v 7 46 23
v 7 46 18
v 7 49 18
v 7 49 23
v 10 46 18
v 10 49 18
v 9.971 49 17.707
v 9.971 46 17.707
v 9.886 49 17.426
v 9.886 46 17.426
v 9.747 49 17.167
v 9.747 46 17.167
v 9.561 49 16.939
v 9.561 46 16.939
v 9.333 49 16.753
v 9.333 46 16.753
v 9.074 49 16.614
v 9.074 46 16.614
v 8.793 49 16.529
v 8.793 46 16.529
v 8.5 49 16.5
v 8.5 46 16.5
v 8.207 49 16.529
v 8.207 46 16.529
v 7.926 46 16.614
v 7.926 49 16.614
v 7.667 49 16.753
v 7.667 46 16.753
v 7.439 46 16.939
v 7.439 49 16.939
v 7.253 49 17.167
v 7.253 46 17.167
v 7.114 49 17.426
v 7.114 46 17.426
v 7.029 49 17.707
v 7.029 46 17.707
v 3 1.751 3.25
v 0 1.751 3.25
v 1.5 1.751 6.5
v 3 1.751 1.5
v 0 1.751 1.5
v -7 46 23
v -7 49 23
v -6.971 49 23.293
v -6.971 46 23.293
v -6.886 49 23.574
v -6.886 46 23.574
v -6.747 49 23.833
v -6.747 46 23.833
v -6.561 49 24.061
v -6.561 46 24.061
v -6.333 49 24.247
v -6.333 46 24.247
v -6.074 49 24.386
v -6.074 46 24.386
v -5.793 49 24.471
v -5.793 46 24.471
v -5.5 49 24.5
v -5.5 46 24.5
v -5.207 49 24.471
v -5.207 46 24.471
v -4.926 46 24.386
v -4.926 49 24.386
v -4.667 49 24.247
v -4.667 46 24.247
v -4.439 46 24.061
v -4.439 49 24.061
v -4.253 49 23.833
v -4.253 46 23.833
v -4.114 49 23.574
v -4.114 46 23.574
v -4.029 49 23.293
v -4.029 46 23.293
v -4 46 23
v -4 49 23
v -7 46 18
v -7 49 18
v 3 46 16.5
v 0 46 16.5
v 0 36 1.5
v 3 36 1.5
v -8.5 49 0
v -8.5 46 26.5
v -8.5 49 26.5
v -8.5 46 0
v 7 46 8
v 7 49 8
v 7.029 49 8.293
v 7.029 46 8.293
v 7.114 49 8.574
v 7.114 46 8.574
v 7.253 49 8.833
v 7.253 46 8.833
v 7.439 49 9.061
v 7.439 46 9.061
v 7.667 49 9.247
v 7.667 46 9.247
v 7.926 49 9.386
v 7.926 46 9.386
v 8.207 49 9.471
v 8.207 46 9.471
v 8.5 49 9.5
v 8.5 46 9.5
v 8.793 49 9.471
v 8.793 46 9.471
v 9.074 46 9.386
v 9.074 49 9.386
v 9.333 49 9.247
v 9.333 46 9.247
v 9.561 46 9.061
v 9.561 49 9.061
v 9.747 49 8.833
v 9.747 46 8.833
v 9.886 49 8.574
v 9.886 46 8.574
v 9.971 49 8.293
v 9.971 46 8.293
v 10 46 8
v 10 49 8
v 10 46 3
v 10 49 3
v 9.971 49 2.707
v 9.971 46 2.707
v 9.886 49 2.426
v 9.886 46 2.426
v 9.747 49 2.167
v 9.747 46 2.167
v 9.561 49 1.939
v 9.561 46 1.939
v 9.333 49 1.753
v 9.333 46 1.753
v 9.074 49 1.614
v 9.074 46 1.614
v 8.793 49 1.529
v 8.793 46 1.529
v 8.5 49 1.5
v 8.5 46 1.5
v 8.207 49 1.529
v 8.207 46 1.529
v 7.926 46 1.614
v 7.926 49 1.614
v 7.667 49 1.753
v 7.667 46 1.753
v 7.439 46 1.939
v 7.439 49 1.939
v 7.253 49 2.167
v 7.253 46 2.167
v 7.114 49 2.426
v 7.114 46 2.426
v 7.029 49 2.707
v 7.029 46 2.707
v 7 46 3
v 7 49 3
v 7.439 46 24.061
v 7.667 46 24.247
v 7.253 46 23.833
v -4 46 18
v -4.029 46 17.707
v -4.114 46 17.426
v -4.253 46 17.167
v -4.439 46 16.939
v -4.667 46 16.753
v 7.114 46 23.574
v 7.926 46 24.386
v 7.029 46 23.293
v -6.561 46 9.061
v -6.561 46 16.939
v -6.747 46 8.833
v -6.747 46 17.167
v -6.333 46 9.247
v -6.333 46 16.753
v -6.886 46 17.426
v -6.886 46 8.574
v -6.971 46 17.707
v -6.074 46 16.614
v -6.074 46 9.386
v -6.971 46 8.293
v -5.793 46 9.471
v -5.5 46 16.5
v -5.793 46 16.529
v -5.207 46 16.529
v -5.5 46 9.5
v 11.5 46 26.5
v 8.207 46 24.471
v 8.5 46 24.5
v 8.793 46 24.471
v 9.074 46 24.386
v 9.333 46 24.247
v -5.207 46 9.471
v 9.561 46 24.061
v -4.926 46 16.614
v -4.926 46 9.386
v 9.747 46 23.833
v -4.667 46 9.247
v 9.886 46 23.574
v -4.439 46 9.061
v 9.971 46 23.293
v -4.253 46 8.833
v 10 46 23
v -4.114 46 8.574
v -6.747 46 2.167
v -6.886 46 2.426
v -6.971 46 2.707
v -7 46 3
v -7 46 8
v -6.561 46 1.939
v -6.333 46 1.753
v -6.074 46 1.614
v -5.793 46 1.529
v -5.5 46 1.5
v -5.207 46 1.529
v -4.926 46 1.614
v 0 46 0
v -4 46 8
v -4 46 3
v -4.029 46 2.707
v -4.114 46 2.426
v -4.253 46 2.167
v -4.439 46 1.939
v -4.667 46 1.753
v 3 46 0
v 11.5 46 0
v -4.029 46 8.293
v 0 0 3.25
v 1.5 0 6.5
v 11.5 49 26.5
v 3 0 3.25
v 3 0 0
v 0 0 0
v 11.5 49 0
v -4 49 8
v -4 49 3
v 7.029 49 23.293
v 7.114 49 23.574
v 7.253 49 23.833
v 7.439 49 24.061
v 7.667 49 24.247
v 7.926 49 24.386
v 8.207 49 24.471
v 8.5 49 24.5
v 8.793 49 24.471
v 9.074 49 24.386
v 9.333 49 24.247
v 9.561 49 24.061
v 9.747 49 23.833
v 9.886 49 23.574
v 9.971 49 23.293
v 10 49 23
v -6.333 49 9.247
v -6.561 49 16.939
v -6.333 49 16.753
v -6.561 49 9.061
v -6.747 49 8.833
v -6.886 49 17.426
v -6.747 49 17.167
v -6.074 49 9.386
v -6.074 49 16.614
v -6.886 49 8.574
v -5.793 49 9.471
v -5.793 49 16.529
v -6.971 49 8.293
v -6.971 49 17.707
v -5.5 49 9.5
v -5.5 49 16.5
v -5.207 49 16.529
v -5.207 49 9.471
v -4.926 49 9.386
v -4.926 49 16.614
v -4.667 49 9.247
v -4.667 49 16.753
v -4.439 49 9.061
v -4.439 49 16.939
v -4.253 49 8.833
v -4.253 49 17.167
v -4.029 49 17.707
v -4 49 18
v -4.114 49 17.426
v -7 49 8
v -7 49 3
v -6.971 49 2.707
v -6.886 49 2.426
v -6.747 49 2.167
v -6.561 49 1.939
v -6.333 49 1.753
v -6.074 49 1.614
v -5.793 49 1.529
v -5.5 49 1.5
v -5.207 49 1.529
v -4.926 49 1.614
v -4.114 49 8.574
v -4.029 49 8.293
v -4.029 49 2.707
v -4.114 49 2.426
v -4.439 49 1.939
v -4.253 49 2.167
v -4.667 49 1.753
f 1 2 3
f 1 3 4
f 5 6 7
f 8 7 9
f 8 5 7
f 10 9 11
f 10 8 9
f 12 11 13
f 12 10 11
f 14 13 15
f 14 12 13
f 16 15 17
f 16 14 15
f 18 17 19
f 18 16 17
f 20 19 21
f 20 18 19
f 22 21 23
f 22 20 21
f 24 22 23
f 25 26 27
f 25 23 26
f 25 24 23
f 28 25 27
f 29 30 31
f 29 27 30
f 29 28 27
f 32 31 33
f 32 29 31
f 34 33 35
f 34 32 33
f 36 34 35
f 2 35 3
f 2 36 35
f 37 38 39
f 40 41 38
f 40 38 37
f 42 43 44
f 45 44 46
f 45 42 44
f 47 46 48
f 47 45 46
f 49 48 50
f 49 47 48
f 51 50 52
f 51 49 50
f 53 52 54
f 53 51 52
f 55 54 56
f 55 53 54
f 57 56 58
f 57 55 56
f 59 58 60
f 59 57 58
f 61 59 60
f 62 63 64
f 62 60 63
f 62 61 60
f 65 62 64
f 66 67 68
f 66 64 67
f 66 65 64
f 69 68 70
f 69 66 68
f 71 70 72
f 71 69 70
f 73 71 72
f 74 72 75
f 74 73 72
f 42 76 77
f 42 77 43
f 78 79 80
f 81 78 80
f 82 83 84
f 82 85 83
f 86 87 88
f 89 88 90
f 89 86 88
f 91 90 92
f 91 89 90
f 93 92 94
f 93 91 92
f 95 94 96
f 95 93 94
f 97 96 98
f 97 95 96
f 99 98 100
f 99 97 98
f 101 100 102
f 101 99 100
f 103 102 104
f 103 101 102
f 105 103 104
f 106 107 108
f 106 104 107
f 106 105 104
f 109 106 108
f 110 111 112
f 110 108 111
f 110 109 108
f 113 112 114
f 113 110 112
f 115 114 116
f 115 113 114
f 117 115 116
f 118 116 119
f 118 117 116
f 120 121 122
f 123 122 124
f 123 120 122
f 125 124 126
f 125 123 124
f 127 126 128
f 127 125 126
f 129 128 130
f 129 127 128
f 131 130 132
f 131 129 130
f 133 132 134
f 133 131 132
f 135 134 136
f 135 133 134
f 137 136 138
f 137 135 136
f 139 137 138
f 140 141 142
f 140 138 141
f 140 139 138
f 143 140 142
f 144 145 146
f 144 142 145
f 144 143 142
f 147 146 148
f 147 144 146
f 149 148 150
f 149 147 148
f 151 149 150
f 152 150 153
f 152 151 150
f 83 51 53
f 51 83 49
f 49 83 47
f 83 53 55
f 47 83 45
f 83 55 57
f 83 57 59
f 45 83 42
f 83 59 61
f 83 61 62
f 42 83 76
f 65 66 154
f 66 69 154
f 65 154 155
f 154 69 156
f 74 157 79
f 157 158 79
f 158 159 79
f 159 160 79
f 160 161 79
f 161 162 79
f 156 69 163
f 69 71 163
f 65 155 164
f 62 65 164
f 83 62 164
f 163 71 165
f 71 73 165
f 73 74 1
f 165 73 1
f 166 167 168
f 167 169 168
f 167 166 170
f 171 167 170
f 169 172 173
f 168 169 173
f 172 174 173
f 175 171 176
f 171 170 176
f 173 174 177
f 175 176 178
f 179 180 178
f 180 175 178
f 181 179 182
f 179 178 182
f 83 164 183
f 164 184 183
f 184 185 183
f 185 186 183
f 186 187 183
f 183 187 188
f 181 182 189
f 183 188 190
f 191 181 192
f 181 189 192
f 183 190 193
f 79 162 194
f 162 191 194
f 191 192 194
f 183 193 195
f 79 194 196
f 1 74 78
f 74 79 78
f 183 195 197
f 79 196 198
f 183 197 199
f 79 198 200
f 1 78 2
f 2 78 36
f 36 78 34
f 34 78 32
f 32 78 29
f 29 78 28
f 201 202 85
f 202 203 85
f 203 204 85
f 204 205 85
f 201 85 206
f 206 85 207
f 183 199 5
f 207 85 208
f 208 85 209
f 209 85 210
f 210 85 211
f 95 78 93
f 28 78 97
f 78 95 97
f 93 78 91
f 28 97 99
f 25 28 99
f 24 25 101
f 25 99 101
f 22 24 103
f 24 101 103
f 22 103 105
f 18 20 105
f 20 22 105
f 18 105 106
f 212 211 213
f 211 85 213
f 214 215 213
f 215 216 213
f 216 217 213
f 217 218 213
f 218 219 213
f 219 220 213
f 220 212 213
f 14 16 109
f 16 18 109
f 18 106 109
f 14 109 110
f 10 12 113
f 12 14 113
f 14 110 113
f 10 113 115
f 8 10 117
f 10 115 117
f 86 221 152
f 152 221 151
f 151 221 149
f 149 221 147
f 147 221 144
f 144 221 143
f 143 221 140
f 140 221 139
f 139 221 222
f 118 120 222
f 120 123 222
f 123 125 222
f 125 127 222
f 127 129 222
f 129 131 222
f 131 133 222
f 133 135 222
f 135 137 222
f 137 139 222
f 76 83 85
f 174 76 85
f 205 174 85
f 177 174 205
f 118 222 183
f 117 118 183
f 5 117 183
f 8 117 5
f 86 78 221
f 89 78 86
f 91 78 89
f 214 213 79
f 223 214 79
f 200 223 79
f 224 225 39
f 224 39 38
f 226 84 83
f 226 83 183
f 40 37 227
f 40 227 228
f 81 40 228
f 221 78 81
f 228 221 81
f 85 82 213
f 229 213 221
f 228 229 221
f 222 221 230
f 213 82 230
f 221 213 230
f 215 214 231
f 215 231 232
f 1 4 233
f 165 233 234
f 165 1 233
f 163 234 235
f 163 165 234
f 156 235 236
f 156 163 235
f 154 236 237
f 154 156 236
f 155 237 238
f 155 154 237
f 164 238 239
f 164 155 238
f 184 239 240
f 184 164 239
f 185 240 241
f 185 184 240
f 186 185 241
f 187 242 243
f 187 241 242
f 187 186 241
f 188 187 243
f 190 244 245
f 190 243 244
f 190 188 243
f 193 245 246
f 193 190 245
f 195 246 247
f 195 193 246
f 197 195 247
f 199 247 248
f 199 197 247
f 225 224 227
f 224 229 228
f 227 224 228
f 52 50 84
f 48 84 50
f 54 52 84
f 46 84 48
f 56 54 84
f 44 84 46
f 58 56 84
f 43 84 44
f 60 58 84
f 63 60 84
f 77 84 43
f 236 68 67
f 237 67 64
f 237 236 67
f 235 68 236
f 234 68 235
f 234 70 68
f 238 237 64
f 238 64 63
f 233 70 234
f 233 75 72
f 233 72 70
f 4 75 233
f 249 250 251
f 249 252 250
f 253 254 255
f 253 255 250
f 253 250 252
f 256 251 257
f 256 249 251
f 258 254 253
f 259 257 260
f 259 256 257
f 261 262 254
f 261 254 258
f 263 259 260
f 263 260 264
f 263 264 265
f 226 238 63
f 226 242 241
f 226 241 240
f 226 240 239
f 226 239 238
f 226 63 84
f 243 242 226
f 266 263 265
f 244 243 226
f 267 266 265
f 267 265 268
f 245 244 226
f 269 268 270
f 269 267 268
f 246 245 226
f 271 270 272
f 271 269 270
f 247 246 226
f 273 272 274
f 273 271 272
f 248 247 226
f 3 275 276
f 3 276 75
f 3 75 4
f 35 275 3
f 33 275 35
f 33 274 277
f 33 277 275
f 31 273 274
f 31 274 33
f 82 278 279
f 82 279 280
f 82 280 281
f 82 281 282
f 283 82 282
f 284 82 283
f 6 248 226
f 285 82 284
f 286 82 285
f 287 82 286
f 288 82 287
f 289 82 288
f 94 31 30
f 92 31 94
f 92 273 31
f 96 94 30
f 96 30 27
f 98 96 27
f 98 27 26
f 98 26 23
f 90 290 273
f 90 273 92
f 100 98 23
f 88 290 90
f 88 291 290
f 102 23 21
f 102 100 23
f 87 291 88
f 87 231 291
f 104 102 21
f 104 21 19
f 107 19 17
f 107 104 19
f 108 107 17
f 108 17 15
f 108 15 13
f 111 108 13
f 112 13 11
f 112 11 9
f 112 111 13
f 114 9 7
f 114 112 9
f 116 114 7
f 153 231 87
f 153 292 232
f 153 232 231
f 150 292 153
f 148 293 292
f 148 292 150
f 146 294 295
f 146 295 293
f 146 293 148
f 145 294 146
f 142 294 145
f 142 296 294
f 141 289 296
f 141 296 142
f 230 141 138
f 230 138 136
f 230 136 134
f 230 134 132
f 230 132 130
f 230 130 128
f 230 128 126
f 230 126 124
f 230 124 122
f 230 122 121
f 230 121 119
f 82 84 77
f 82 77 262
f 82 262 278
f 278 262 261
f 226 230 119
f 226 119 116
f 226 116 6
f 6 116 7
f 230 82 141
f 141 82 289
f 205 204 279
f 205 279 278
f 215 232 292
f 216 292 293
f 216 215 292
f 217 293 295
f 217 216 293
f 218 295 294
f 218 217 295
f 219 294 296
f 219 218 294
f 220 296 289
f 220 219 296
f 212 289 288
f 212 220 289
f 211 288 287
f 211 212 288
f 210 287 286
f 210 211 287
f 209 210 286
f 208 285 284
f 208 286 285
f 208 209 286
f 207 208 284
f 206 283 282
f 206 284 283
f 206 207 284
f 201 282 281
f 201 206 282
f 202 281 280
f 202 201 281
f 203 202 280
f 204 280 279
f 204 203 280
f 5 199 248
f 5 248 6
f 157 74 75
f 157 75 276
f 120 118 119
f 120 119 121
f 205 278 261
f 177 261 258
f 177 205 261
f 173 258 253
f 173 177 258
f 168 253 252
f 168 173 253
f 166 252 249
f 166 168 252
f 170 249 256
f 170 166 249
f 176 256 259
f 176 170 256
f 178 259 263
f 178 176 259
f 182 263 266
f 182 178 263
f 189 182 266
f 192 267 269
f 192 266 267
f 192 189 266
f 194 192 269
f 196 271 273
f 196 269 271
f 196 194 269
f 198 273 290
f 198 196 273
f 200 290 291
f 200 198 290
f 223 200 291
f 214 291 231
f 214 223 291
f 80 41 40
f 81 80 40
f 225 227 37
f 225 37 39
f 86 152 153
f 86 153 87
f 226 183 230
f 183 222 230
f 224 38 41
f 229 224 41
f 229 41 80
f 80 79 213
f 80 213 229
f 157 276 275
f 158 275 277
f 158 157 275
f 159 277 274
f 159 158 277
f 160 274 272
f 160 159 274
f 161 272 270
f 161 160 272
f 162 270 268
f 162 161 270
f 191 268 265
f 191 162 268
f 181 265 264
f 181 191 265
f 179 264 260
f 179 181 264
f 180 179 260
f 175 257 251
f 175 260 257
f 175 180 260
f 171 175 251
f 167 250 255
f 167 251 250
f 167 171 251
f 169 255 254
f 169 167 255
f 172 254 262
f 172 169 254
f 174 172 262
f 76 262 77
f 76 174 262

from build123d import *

# Parameters (mm, degrees)
BOSS_EXTRUDE1_DEPTH = 1.5
SKETCH2_W           = 3
SKETCH2_H           = 1.750926398
BOSS_EXTRUDE2_DEPTH = 5
SKETCH3_W           = 20
SKETCH3_H           = 3
BOSS_EXTRUDE3_DEPTH = 25
CUT_EXTRUDE1_DEPTH  = 5
CUT_EXTRUDE2_DEPTH  = 10
BOSS_EXTRUDE4_DEPTH = 3


with BuildPart() as part:
    # Sketch1 → Boss-Extrude1 (new body)
    with BuildSketch(Plane.XY):
        Polygon((3, 46), (11.5, 46), (11.5, 49), (-8.5, 49), (-8.5, 46), (0, 46), (0, 0), (3, 0), align=None)
    extrude(amount=BOSS_EXTRUDE1_DEPTH)

    # Sketch2 → Boss-Extrude2 (add)
    with BuildSketch(Plane.XY.offset(1.5)):
        with Locations((1.5, 0.875463199)):
            Rectangle(SKETCH2_W, SKETCH2_H)
    extrude(amount=BOSS_EXTRUDE2_DEPTH)

    # Sketch3 → Boss-Extrude3 (add)
    with BuildSketch(Plane.XY.offset(1.5)):
        with Locations((1.5, 47.5)):
            Rectangle(SKETCH3_W, SKETCH3_H)
    extrude(amount=BOSS_EXTRUDE3_DEPTH)

    # Sketch4 → Cut-Extrude1 (cut)
    with BuildSketch(Plane.XZ):
        Polygon((1.5, 6.5), (0, 3.25), (-2.721053337, 3.25), (-2.721053337, 9.447530039), (6.003312616, 9.447530039), (5.654337978, 3.25), (3, 3.25), align=None)
    extrude(amount=-CUT_EXTRUDE1_DEPTH, mode=Mode.SUBTRACT)

    # Sketch5 → Cut-Extrude2 (cut)
    with BuildSketch(Plane.XZ.offset(-46)):
        with BuildLine():
            Line((-4, 8), (-4, 3))
            ThreePointArc((-4, 3), (-5.5, 1.5), (-7, 3))
            Line((-7, 3), (-7, 8))
            ThreePointArc((-7, 8), (-5.5, 9.5), (-4, 8))
        make_face()
        with BuildLine():
            Line((10, 8), (10, 3))
            ThreePointArc((10, 3), (8.5, 1.5), (7, 3))
            Line((7, 3), (7, 8))
            ThreePointArc((7, 8), (8.5, 9.5), (10, 8))
        make_face()
        with BuildLine():
            Line((10, 23), (10, 18))
            ThreePointArc((10, 18), (8.5, 16.5), (7, 18))
            Line((7, 18), (7, 23))
            ThreePointArc((7, 23), (8.5, 24.5), (10, 23))
        make_face()
        with BuildLine():
            Line((-4, 23), (-4, 18))
            ThreePointArc((-4, 18), (-5.5, 16.5), (-7, 18))
            Line((-7, 18), (-7, 23))
            ThreePointArc((-7, 23), (-5.5, 24.5), (-4, 23))
        make_face()
    extrude(amount=-CUT_EXTRUDE2_DEPTH, mode=Mode.SUBTRACT)

    # Sketch6 → Boss-Extrude4 (add)
    with BuildSketch(Plane.ZY):
        Polygon((1.5, 46), (16.5, 46), (1.5, 36), align=None)
    extrude(amount=-BOSS_EXTRUDE4_DEPTH)


solid = part.part
